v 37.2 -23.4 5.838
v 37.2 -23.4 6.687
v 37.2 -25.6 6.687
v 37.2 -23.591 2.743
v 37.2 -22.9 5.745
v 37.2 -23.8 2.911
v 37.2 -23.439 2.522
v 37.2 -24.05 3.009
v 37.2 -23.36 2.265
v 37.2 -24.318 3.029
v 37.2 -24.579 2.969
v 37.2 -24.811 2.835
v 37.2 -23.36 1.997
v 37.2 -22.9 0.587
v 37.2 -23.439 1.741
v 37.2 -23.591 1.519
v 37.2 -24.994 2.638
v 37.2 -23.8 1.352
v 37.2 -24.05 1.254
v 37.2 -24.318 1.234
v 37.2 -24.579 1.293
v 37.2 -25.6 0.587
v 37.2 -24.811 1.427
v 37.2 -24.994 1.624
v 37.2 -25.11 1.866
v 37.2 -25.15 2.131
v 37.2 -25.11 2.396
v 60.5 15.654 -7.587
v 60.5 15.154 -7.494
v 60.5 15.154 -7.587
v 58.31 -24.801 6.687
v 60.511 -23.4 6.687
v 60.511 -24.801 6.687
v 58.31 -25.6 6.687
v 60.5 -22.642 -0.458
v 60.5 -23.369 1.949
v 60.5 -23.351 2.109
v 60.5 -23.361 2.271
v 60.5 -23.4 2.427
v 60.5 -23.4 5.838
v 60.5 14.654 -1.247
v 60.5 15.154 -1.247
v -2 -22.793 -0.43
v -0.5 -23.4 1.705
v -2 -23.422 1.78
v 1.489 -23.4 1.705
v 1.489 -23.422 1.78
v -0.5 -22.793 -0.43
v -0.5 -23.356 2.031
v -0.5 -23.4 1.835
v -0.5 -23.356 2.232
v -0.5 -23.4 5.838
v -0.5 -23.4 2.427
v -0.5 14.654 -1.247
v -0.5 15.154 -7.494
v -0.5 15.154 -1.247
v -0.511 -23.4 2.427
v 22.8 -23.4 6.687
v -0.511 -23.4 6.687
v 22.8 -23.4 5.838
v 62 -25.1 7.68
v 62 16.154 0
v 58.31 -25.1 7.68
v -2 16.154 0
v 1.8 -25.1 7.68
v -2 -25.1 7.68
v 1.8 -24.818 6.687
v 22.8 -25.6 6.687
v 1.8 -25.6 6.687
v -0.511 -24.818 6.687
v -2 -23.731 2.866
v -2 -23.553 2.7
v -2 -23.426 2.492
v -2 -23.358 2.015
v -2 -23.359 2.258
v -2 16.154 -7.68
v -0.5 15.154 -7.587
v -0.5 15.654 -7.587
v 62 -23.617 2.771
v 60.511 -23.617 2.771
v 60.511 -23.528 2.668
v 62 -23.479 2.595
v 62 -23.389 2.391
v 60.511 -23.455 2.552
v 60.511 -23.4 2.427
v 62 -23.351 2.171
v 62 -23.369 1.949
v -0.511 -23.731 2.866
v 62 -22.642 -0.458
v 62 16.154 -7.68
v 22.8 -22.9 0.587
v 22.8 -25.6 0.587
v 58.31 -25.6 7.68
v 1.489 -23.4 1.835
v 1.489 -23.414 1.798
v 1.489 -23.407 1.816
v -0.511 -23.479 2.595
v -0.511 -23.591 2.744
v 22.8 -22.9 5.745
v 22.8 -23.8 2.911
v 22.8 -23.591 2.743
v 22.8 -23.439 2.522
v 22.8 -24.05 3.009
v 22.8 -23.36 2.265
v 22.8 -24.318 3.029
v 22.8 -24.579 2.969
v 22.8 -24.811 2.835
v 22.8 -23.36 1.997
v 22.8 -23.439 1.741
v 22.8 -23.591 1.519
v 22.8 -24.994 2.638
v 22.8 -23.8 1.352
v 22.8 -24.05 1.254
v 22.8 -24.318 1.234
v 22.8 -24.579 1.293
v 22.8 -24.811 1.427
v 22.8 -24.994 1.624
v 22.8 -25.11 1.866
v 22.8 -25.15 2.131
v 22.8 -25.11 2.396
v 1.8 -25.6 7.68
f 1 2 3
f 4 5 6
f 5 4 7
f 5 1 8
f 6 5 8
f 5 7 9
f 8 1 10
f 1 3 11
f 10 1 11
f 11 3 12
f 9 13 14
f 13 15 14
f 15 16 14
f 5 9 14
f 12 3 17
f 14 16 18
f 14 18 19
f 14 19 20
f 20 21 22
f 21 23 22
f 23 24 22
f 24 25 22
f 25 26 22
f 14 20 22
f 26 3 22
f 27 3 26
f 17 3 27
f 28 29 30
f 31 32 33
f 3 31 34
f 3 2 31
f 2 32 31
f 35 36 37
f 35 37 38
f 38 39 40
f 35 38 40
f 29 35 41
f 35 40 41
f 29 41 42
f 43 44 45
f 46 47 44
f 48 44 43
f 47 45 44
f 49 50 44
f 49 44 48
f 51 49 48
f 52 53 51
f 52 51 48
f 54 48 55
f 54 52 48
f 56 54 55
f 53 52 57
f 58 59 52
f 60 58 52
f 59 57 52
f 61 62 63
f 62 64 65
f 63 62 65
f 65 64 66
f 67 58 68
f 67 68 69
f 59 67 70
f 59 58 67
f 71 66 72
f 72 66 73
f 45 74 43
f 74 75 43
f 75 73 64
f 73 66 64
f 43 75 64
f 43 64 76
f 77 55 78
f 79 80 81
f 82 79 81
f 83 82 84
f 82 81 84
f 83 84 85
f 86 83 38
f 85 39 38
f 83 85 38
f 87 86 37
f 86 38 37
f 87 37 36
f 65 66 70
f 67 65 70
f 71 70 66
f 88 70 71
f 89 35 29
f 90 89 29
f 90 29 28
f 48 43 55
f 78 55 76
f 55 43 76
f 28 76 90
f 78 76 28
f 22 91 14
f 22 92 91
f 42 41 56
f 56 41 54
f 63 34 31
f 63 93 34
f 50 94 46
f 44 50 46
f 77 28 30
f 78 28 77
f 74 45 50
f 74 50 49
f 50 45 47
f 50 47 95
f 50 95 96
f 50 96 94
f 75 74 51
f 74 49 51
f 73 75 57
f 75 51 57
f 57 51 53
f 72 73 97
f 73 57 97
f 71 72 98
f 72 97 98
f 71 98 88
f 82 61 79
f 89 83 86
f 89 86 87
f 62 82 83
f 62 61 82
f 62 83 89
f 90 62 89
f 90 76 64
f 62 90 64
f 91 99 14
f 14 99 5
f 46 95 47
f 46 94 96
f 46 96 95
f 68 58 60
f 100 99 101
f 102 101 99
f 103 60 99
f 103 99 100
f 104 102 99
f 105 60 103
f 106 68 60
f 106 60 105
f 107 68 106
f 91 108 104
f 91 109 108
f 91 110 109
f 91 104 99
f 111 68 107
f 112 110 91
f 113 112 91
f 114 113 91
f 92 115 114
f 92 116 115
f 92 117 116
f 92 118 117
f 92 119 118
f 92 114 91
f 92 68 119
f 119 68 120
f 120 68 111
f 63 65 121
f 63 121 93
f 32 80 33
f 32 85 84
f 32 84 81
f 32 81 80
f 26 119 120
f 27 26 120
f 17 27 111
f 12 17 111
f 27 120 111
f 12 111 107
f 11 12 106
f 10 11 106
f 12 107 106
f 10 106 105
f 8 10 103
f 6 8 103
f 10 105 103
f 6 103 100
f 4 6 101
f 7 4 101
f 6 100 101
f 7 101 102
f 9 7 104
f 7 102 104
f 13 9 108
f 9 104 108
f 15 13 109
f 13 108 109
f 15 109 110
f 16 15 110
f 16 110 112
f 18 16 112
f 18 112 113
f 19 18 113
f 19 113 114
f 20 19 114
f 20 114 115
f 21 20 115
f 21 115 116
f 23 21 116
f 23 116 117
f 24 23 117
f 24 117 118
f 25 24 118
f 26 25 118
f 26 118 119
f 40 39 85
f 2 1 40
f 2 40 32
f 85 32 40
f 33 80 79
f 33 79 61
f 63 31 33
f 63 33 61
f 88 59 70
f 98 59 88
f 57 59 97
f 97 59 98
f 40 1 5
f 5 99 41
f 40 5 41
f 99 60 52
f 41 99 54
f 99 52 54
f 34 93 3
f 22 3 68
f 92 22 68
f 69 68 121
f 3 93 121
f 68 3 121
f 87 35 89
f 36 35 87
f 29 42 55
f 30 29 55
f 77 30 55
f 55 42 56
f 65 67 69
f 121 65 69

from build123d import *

# Parameters (mm, degrees)
F1_DEPTH  = 60
F2_T      = -1.5
F4_DEPTH  = 1.7
F6_DEPTH  = 1.5
F8_DEPTH  = 7.7
F9_DEPTH  = 0.1
F10_DEPTH = 0.4
F11_DEPTH = 0.5
F13_R     = 0.9
F14_DEPTH = 25
F15_DEPTH = 63.1
F17_DEPTH = 1.8
F19_DEPTH = 1.69
F20_DEPTH = 1.6
F21_DEPTH = 2
F22_DEPTH = 2
F23_DEPTH = 2
F24_DEPTH = 2
F25_DEPTH = 0.5
F26_DEPTH = 0.5
F27_DEPTH = 25
F28_DEPTH = 0.5


with BuildPart() as f1:
    # F0 (on Right) → F1 (new body)
    with BuildSketch(Plane.YZ):
        Polygon((16.1535342058, -7.67995), (16.1535342058, 0), (-25.1004657942, 7.67995), (-25.1004657942, 0), align=None)
    extrude(amount=F1_DEPTH)

    # F2
    f2_openings = [f1.faces().sort_by_distance(p)[0] for p in [
        (30, -4.473466, -3.839975),
    ]]
    offset(amount=F2_T, openings=f2_openings)

    # F3 (on face) → F4 (cut)
    with BuildSketch(Plane.XZ.offset(25.1004657942)):
        Polygon((30, 0), (37.3, 0), (58.5109069943, 0), (58.5109069943, 6.6873678006), (1.489095157, 6.6873678006), (1.489095157, 0), (22.7, 0), align=None)
    extrude(amount=-F4_DEPTH, mode=Mode.SUBTRACT)

    # F5 (on face) → F6 (cut)
    with BuildSketch(Plane(origin=(0, -0.8407565289, -4.5162494345), x_dir=(1, 0, 0), z_dir=(0, -0.1830181807, -0.9831095288))):
        Polygon((1.5, 23.1507361077), (58.5, 23.1507361077), (58.5109069943, 24.6765070987), (1.489095157, 24.6765070987), align=None)
    extrude(amount=-F6_DEPTH, mode=Mode.SUBTRACT)

    # F7 (on face) → F8 (join)
    with BuildSketch(Plane(origin=(0, 0, 6.6873678006), x_dir=(1, 0, 0), z_dir=(0, 0, -1))):
        Polygon((22.8000010757, 23.4004657942), (30.0000010757, 23.4004657942), (37.2000010757, 23.4004657942), (37.2000010757, 25.1004657942), (22.8000010757, 25.1004657942), align=None)
    extrude(amount=F8_DEPTH)

    # F9 (add): a face of the model
    f9_faces = [f1.faces().sort_by_distance(p)[0] for p in [
        (29.9999984717, -25.1004657942, 4.2501617501),
    ]]
    extrude(f9_faces, amount=F9_DEPTH)

    # F10 (add): a face of the model
    f10_faces = [f1.faces().sort_by_distance(p)[0] for p in [
        (29.9999984717, -25.2004657942, 4.2501617501),
    ]]
    extrude(f10_faces, amount=F10_DEPTH)

    # F11 (add): a face of the model
    f11_faces = [f1.faces().sort_by_distance(p)[0] for p in [
        (30.0000010757, -23.4004657942, 2.4125352339),
    ]]
    extrude(f11_faces, amount=F11_DEPTH)

    # F13 (on face) → F14 (join)
    with BuildSketch(Plane(origin=(22.8000010757, 0, 0), x_dir=(0, -1, 0), z_dir=(-1, 0, 0))):
        with Locations((24.2503285408, 2.1311247256)):
            Circle(F13_R)
    extrude(amount=F14_DEPTH)

    # F15 (cut): a face of the model
    f15_faces = [f1.faces().sort_by_distance(p)[0] for p in [
        (-2.1999989243, -24.2503285408, 2.1311247256),
    ]]
    extrude(f15_faces, amount=-F15_DEPTH, mode=Mode.SUBTRACT)

    # F16 (on face) → F17 (cut)
    with BuildSketch(Plane(origin=(0, 0, 0), x_dir=(0, -1, 0), z_dir=(-1, 0, 0))):
        Polygon((25.1004657942, 7.67995), (22.7930747999, -0.4295498004), (25.6004657942, 0), (25.6004657942, 7.67995), align=None)
    extrude(amount=-F17_DEPTH, mode=Mode.SUBTRACT)

    # F18 (on face) → F19 (cut)
    with BuildSketch(Plane.YZ.offset(60)):
        Polygon((-22.6419516364, -0.4576832745), (-25.1004657942, 7.67995), (-25.6004657942, 7.67995), (-25.6004657942, 0), align=None)
    extrude(amount=-F19_DEPTH, mode=Mode.SUBTRACT)

    # F20 (cut): a face of the model
    f20_faces = [f1.faces().sort_by_distance(p)[0] for p in [
        (30.0000010757, -24.2504657942, -1.0126321994),
    ]]
    extrude(f20_faces, amount=-F20_DEPTH, mode=Mode.SUBTRACT)

    # F21 (add): a face of the model
    f21_faces = [f1.faces().sort_by_distance(p)[0] for p in [
        (0, -3.8923715411, -0.0707367211),
    ]]
    extrude(f21_faces, amount=F21_DEPTH)

    # F22 (cut): faces of the model
    f22_faces = [f1.faces().sort_by_distance(p)[0] for p in [
        (1.5, -4.3223600686, -0.7846449221),
        (1.489095157, -23.887211668, 5.1322390537),
    ]]
    extrude(f22_faces, amount=-F22_DEPTH, mode=Mode.SUBTRACT)

    # F23 (add): a face of the model
    f23_faces = [f1.faces().sort_by_distance(p)[0] for p in [
        (60, -3.8610992798, -0.074441199),
    ]]
    extrude(f23_faces, amount=F23_DEPTH)

    # F24 (cut): faces of the model
    f24_faces = [f1.faces().sort_by_distance(p)[0] for p in [
        (58.5109069943, -23.8729043508, 5.1821889961),
        (58.5, -4.2998130012, -0.7863611565),
    ]]
    extrude(f24_faces, amount=-F24_DEPTH, mode=Mode.SUBTRACT)

    # F25 (cut): a face of the model
    f25_faces = [f1.faces().sort_by_distance(p)[0] for p in [
        (30, 14.6535342058, -4.3236166646),
    ]]
    extrude(f25_faces, amount=-F25_DEPTH, mode=Mode.SUBTRACT)

    # F26 (cut): a face of the model
    f26_faces = [f1.faces().sort_by_distance(p)[0] for p in [
        (30, 15.1535342058, -4.3236166646),
    ]]
    extrude(f26_faces, amount=-F26_DEPTH, mode=Mode.SUBTRACT)

    # F27 (cut): a face of the model
    f27_faces = [f1.faces().sort_by_distance(p)[0] for p in [
        (30, 15.1535342058, -7.4007061691),
    ]]
    extrude(f27_faces, amount=-F27_DEPTH, mode=Mode.SUBTRACT)

    # F28 (add): a face of the model
    f28_faces = [f1.faces().sort_by_distance(p)[0] for p in [
        (30, 15.6535342058, -4.4166979416),
    ]]
    extrude(f28_faces, amount=F28_DEPTH)


solid = f1.part
